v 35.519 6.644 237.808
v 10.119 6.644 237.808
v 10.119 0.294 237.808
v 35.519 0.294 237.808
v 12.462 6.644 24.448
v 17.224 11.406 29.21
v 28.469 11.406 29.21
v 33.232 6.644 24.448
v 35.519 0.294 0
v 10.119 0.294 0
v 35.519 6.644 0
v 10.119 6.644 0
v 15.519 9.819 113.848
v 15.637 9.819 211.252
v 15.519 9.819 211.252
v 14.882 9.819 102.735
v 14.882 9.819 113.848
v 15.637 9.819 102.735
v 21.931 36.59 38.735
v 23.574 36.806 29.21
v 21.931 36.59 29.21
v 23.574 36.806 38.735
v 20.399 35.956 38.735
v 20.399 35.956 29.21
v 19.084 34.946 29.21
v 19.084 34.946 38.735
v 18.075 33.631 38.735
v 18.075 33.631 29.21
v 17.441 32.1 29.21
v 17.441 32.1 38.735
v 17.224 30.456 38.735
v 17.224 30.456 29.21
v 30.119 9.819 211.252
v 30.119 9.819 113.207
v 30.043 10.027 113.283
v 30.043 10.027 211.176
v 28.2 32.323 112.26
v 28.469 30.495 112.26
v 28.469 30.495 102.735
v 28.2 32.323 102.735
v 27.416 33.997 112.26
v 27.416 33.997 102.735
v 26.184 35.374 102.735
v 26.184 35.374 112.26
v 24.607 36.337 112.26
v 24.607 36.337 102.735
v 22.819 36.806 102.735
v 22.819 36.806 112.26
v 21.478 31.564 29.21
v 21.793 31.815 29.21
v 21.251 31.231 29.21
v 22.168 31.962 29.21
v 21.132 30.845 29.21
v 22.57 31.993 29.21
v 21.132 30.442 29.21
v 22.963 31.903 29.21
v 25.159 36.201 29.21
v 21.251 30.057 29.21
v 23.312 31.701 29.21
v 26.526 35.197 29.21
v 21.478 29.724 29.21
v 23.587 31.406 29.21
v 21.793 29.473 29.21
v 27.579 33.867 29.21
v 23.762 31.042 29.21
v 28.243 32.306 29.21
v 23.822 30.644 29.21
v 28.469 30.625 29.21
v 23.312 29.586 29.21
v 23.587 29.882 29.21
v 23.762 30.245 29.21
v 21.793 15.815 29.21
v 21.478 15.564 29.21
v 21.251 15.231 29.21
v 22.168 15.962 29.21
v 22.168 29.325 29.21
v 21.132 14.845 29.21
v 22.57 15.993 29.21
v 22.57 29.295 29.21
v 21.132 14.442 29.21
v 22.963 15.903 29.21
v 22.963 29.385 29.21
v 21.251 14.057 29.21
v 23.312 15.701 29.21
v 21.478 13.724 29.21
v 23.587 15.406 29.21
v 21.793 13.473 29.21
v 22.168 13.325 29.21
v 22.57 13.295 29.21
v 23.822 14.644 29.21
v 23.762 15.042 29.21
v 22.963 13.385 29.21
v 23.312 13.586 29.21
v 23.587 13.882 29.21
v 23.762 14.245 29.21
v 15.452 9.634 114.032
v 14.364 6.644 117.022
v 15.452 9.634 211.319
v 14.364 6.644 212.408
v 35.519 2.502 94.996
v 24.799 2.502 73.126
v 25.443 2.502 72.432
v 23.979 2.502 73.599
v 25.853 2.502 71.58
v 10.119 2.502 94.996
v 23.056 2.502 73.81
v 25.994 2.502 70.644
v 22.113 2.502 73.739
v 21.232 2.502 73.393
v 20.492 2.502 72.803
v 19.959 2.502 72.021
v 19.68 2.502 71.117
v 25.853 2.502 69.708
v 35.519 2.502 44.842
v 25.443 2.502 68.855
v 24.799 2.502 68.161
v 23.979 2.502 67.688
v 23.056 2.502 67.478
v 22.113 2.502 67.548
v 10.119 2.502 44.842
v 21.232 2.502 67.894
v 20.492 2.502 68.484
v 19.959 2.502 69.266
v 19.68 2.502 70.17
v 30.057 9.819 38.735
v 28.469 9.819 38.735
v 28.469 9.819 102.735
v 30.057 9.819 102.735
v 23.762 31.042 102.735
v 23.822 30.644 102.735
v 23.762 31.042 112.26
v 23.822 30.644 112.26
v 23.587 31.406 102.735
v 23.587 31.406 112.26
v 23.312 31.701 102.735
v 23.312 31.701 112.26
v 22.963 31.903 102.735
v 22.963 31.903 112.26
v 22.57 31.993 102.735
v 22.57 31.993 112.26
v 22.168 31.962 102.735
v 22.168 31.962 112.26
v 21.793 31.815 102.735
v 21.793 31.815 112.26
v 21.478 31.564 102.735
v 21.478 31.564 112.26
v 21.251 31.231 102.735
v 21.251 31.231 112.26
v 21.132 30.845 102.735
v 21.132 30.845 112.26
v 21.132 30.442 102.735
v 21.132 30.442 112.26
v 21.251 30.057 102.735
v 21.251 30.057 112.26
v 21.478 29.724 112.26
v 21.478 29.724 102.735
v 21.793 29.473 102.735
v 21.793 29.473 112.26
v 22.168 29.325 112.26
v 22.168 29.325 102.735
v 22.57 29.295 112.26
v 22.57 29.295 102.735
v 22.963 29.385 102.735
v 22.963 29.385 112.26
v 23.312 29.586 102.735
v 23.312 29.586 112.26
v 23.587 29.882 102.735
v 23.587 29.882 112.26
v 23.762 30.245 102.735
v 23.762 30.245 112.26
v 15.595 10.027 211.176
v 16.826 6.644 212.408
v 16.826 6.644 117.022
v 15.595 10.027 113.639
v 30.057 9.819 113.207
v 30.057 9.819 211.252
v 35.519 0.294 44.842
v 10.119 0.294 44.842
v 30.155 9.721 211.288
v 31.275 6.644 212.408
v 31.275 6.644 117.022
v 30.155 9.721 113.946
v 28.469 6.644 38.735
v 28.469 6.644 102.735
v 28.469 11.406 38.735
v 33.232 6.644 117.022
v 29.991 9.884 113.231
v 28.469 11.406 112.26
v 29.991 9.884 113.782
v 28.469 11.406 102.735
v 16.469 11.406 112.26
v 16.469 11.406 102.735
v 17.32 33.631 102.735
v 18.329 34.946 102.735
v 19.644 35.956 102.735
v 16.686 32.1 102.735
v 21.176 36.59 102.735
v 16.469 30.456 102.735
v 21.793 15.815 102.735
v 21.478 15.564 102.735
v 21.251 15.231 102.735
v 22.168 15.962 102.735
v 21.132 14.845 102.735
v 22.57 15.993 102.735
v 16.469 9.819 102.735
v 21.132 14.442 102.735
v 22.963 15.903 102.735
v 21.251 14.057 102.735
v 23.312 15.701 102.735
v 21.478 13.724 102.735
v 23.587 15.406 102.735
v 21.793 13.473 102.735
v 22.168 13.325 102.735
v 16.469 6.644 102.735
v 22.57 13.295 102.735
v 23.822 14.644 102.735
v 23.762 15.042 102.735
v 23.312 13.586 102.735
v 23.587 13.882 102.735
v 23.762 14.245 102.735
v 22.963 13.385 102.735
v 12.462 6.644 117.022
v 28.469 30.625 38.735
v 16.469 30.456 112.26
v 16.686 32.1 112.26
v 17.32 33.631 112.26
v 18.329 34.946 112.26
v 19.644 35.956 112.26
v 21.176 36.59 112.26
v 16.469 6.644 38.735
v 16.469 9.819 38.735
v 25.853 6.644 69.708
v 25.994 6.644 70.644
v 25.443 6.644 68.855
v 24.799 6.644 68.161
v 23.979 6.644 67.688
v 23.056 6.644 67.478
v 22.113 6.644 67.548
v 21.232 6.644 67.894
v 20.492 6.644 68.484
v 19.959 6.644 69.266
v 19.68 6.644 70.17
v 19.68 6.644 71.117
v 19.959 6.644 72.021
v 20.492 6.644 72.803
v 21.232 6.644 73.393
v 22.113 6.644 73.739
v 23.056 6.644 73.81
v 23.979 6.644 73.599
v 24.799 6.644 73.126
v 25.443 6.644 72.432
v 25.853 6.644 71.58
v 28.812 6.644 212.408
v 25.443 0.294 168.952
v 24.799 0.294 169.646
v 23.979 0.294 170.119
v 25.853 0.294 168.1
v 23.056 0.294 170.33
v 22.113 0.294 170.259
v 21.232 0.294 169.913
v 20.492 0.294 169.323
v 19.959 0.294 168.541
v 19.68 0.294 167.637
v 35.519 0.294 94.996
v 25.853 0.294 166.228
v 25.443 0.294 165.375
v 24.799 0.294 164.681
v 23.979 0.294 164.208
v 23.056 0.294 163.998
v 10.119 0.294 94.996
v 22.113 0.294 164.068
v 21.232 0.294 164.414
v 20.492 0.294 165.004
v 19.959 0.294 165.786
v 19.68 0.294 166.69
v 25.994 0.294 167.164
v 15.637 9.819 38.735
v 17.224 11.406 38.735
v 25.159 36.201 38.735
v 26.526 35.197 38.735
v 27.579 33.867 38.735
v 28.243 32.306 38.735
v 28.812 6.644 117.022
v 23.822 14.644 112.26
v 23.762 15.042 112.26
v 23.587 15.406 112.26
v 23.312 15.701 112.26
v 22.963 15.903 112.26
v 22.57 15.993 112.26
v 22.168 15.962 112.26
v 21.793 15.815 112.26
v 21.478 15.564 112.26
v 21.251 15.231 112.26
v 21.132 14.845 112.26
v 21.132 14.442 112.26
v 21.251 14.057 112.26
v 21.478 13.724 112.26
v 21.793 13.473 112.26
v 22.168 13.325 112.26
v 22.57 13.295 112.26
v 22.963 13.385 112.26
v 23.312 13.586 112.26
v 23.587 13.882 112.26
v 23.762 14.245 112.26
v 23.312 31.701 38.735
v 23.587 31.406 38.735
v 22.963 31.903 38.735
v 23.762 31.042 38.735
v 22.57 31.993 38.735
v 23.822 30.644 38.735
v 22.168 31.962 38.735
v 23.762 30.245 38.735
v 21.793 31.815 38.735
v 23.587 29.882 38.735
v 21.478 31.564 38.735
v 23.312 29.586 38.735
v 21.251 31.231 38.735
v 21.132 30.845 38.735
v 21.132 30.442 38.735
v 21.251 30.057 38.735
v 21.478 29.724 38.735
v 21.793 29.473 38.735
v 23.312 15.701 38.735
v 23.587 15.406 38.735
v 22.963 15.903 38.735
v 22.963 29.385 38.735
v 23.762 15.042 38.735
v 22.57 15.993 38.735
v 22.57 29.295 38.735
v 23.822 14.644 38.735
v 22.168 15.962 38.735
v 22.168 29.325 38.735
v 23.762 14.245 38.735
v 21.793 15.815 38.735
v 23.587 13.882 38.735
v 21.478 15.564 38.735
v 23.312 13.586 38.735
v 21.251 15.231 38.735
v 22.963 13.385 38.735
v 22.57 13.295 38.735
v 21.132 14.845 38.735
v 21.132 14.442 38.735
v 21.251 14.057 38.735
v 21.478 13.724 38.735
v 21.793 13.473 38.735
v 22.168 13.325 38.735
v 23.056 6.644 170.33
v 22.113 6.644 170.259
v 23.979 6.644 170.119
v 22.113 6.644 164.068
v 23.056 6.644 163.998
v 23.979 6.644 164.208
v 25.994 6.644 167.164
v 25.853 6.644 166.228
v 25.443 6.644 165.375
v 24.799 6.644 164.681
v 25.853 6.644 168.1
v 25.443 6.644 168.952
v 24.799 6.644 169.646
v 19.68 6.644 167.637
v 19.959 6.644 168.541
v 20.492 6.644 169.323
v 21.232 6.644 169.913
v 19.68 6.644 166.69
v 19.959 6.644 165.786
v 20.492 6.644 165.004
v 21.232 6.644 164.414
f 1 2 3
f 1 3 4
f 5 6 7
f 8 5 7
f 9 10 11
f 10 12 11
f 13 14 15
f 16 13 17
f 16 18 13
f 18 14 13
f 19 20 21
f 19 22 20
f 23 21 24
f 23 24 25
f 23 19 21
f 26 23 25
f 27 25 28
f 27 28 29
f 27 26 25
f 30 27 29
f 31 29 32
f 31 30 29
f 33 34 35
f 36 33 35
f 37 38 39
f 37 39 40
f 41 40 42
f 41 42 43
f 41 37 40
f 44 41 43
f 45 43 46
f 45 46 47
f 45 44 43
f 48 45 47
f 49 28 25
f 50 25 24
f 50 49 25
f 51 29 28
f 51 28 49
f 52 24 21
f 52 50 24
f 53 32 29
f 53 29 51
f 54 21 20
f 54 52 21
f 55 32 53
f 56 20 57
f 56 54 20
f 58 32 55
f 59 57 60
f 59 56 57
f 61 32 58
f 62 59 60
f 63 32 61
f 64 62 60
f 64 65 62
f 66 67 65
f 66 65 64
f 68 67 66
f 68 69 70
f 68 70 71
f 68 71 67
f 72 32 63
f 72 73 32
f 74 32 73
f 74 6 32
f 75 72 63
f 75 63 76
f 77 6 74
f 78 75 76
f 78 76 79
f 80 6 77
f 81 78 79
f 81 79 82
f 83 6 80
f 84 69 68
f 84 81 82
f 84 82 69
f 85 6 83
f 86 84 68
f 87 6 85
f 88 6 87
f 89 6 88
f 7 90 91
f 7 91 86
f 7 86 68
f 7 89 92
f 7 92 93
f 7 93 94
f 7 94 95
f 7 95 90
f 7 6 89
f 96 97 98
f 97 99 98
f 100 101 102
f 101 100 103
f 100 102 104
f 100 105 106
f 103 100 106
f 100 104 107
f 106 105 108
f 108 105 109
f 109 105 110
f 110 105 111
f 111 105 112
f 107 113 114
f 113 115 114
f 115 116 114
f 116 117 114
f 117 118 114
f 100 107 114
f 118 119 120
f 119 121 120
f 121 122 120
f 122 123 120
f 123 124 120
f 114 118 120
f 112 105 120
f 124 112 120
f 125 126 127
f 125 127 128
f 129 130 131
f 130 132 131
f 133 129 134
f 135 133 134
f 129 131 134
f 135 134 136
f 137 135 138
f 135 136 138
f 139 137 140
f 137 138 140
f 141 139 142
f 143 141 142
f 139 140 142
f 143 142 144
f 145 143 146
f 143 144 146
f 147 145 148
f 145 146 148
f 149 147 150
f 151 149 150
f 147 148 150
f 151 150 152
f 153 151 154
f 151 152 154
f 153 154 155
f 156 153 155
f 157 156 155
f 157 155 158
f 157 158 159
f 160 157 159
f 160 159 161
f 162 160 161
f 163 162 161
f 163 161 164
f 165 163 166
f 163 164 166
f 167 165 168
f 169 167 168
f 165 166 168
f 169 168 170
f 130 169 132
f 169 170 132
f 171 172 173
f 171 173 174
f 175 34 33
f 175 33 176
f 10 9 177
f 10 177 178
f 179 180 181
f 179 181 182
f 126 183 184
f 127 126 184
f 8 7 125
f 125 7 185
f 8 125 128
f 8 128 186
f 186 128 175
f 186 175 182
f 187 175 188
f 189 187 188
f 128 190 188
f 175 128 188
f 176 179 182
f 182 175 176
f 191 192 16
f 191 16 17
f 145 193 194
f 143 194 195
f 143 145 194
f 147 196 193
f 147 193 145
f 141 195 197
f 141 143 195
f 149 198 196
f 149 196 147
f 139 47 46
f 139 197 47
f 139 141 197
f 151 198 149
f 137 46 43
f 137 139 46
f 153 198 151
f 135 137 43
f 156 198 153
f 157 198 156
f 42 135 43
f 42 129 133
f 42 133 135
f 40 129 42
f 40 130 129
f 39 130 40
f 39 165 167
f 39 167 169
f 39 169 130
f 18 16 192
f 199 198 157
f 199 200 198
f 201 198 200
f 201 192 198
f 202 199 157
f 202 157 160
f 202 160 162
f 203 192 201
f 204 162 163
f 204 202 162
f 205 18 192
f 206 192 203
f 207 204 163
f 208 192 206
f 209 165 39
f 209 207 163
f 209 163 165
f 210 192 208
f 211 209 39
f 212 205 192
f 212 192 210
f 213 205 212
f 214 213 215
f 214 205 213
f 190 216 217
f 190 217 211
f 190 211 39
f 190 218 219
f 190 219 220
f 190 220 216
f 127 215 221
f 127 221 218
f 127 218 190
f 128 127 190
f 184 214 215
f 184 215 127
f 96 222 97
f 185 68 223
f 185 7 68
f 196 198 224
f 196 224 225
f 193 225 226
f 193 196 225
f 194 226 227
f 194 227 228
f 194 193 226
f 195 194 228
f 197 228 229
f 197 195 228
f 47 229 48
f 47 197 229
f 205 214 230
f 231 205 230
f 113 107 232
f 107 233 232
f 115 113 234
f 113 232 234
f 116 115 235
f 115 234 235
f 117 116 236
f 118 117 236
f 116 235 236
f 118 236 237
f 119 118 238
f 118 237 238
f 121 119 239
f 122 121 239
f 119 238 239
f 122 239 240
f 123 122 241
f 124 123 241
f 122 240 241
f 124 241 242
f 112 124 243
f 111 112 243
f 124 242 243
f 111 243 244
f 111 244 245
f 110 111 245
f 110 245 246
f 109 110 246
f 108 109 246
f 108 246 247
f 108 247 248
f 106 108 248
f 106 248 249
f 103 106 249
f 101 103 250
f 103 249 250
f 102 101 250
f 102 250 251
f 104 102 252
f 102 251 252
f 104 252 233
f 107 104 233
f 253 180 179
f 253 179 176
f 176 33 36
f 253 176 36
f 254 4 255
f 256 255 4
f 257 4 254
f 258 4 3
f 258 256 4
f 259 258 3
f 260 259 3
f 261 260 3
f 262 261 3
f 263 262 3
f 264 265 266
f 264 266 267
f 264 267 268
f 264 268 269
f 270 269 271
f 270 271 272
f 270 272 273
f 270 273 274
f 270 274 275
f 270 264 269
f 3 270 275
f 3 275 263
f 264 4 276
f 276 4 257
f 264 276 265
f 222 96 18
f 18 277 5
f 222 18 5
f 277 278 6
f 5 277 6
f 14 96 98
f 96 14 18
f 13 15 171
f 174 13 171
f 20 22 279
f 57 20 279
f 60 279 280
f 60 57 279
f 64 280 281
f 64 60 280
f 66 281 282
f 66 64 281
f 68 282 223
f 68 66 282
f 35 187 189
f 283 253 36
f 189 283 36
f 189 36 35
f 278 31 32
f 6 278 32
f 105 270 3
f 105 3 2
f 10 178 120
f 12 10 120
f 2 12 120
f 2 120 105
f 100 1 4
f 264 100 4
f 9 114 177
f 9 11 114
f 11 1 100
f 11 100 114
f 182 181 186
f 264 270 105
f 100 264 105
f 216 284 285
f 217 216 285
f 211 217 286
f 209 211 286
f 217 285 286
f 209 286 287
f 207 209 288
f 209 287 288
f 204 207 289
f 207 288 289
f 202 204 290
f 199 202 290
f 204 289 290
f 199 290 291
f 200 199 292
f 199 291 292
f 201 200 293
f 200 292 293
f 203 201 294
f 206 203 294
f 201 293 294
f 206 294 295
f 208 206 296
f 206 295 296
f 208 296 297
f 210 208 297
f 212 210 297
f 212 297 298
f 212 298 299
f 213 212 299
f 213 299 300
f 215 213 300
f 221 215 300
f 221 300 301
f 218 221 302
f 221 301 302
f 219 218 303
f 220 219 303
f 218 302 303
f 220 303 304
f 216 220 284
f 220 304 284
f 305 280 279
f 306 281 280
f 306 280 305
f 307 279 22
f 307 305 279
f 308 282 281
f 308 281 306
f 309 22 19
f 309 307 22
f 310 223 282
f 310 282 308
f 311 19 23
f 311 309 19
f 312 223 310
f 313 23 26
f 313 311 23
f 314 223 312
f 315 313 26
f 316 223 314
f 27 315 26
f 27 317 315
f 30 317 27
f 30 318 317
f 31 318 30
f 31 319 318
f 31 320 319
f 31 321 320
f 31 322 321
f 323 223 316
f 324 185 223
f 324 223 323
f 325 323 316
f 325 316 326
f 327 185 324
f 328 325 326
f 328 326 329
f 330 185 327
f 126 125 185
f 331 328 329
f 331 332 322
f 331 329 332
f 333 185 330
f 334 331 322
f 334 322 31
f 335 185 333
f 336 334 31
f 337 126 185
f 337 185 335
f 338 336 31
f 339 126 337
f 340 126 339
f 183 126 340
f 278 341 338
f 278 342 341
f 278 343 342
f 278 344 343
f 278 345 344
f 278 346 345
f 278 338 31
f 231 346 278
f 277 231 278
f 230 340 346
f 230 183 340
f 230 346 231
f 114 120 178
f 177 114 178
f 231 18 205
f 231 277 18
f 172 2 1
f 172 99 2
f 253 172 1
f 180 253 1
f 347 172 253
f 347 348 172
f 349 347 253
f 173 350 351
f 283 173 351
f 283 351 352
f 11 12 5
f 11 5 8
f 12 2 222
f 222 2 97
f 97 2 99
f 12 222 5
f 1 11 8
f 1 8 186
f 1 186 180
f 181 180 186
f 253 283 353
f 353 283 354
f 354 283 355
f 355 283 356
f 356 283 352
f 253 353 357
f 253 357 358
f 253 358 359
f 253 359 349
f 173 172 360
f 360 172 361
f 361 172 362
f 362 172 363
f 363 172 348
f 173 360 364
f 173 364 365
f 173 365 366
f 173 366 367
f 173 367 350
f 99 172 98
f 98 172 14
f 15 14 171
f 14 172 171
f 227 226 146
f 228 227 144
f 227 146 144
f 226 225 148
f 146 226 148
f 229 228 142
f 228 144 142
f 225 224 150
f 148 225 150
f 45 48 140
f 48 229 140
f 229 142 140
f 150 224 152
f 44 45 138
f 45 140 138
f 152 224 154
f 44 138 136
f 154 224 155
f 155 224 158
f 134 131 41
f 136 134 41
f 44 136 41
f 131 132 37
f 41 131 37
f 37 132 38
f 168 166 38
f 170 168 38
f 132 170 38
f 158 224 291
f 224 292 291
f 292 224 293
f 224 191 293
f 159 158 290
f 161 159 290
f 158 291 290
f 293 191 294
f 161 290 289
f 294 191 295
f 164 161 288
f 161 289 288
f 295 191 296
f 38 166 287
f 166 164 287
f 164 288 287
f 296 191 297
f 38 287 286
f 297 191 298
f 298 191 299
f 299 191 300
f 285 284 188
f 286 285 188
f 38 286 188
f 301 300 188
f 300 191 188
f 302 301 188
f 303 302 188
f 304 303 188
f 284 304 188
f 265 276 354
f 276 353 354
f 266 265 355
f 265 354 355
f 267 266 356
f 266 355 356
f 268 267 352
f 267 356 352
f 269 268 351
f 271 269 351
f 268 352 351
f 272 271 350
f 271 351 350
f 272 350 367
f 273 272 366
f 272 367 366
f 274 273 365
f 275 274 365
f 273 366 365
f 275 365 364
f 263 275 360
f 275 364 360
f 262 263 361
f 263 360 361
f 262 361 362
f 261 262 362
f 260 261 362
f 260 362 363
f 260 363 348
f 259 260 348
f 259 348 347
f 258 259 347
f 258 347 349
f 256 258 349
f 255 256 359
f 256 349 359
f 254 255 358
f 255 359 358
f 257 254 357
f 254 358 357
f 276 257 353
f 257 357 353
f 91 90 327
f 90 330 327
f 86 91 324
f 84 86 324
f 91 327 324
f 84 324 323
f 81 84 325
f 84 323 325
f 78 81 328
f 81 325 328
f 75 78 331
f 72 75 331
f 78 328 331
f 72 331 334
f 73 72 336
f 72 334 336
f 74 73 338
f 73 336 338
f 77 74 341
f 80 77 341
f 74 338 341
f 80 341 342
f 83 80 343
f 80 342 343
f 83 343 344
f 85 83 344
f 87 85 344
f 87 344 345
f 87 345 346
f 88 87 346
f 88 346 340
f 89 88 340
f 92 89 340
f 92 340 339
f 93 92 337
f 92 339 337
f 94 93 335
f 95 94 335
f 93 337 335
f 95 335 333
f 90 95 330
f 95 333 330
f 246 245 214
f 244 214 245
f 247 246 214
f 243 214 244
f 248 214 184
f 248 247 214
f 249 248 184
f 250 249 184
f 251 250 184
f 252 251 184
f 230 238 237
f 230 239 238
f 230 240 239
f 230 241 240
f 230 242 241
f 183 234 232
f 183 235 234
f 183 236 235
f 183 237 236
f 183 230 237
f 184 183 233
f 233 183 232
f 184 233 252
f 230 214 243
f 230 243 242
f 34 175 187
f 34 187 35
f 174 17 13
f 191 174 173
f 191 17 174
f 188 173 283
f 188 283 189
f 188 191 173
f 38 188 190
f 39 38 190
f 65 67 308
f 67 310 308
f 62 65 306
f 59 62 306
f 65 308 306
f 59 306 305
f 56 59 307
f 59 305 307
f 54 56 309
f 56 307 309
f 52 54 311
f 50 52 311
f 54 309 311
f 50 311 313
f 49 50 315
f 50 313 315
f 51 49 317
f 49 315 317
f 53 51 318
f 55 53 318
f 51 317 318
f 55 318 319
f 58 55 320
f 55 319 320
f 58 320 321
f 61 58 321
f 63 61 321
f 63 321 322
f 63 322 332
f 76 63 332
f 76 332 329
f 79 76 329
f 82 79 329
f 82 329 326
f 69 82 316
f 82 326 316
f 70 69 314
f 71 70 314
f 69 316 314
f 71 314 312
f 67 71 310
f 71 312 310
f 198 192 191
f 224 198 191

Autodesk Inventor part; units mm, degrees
ref_plane "YZ Plane" through (0, 0, 0) normal (1, 0, 0) x (0, 1, 0)
ref_plane "XZ Plane" through (0, 0, 0) normal (0, 1, 0) x (-1, 0, 0)
ref_plane "XY Plane" through (0, 0, 0) normal (0, 0, 1) x (1, 0, 0)
sketch "Sketch1" plane through (0, 0, 0) normal (0, 0, 1) x (1, 0, 0)
  line L0 (10.1192, 6.6438) -> (35.5192, 6.6438)
  line L1 (35.5192, 6.6438) -> (35.5192, 0.2938)
  line L2 (35.5192, 0.2938) -> (10.1192, 0.2938)
  line L3 (10.1192, 0.2938) -> (10.1192, 6.6438)
  point P0 (0, 0)
  dimension "d0" = 25.4
  dimension "d1" = 6.35
extrude "Extrusion1" add sketch "Sketch1" along normal blind 237.8075
sketch "Sketch2" plane through (10.1192, 6.6438, 0) normal (0, 1, 0) x (1, 0, 0)
  line L0 (0, 0) -> (25.4, 0) projected
  line L1 (0, 0) -> (0, -237.8075) projected
  line L2 (25.4, -237.8075) -> (0, -237.8075) projected
  line L3 (25.4, 0) -> (25.4, -237.8075) projected
  line L4 (12.7, 0) -> (12.7, -237.8075) construction
  line L5 (25.4, -237.8075) -> (0, -237.8075) construction
  line L6 (0, 0) -> (0, -237.8075) construction
  line L7 (0, -167.1637) -> (25.4, -167.1637) construction
  line L8 (0, -70.6437) -> (25.4, -70.6437) construction
  line L9 (25.4, 0) -> (25.4, -237.8075) construction
  circle A0 centre (12.7, -70.6437) radius 3.175
  circle A1 centre (12.7, -167.1637) radius 3.175
  line L10 (32.1721, -167.1637) -> (32.1721, -237.8075) construction
  line L11 (29.604, -70.6437) -> (29.604, 0) construction
  point P0 (-10.1192, 0)
  dimension "d6" = 6.35
  dimension "d7" = 6.35
  dimension "d10" = 96.52
extrude "Extrusion2" cut sketch "Sketch2" against normal through all contours A0 | A1
sketch "Sketch3" plane through (10.1192, 0.2938, 0) normal (-1, 0, 0) x (0, 0, 1)
  line L0 (44.8421, -2.7964) -> (94.9957, -2.7964)
  line L1 (94.9957, -2.7964) -> (94.9957, 2.2087)
  line L2 (94.9957, 2.2087) -> (44.8421, 2.2087)
  line L3 (44.8421, 2.2087) -> (44.8421, -2.7964)
  point P0 (0, -0.2938)
extrude "Extrusion3" cut sketch "Sketch3" against normal through all
sketch "Sketch4" plane through (10.1192, 6.6438, 0) normal (0, 1, 0) x (1, 0, 0)
  line L0 (18.35, -38.735) -> (6.35, -38.735) projected
  line L1 (6.35, -102.735) -> (18.35, -102.735) projected
  line L2 (18.35, -38.735) -> (7.105, -38.735)
  line L3 (7.105, -38.735) -> (7.105, -29.21)
  line L4 (7.105, -29.21) -> (18.35, -29.21)
  line L5 (18.35, -29.21) -> (18.35, -38.735)
  line L6 (18.35, -102.735) -> (6.35, -102.735)
  line L7 (6.35, -102.735) -> (6.35, -112.26)
  line L8 (6.35, -112.26) -> (18.35, -112.26)
  line L9 (18.35, -112.26) -> (18.35, -102.735)
  point P0 (-10.1192, 0)
  dimension "d13" = 9.525
  dimension "d14" = 9.525
extrude "Extrusion4" add sketch "Sketch4" along normal blind 30.1625
chamfer "Chamfer1" distance 4.7625 angle 45 2 edges at (22.8467, 6.6438, 29.21) (22.4692, 6.6438, 112.26)
sketch "Sketch5" plane through (16.4692, 36.8063, 112.26) normal (0, 0, 1) x (1, 0, 0)
  circle A0 centre (6, -22.1625) radius 1.3525 projected
  circle A1 centre (6, -6.1625) radius 1.3525 projected
  point P0 (-16.4692, -36.8063)
extrude "Extrusion5" cut sketch "Sketch5" against normal through all
fillet "Fillet1" radius 6.35 4 edges at (16.4692, 36.8063, 107.4975) (28.4692, 36.8063, 107.4975) (17.2242, 36.8063, 33.9725) (28.4692, 36.8063, 33.9725)
chamfer "Chamfer2" distance 4.7625 angle 45 4 edges at (16.4692, 6.6438, 109.8788) (28.4692, 6.6438, 109.8788) (28.4692, 6.6438, 31.5913) (17.2242, 6.6438, 31.5913)
sketch "Sketch6" plane through (10.1192, 6.6438, 0) normal (0, 1, 0) x (1, 0, 0)
  line L0 (25.4, -237.8075) -> (0, -237.8075) projected
  line L1 (18.6927, -237.8075) -> (21.1555, -237.8075)
  line L2 (21.1555, -212.4075) -> (21.1555, -112.0518)
  line L3 (21.1555, -112.0518) -> (18.6927, -112.0518)
  line L4 (18.6927, -112.0518) -> (18.6927, -212.4075)
  line L5 (6.7073, -237.8075) -> (4.2445, -237.8075)
  line L6 (4.2445, -212.4075) -> (4.2445, -112.0518)
  line L7 (4.2445, -112.0518) -> (6.7073, -112.0518)
  line L8 (6.7073, -112.0518) -> (6.7073, -212.4075)
  line L9 (25.4, 0) -> (25.4, -237.8075) projected
  line L10 (0, 0) -> (0, -237.8075) projected
  line L11 (21.1555, -171.8415) -> (25.4, -171.8415)
  line L12 (4.2445, -171.8415) -> (0, -171.8415)
  line L13 (20.8665, -0.289) -> (18.4037, -0.289)
  line L14 (18.4037, -34.2615) -> (20.8665, -34.2615)
  line L15 (7.105, -29.21) -> (2.3425, -24.4475) projected
  line L16 (3.9555, -0.289) -> (6.4182, -0.289)
  line L17 (6.4182, -28.5232) -> (3.9555, -28.5232)
  line L18 (31.115, -212.4075) -> (-5.715, -212.4075) projected
  point P0 (-10.1192, 0)
  point P1 (21.1555, -225.1075)
  point P2 (18.6927, -225.1075)
  point P3 (6.7073, -225.1075)
  point P4 (4.2445, -225.1075)
extrude "Extrusion6" add sketch "Sketch6" along normal blind 4.7625 draft -20 contours L18 L4 L3 L2 | L18 L6 L7 L8
sketch "Sketch7" plane through (10.1192, 6.6438, 0) normal (0, 1, 0) x (1, 0, 0)
  line L0 (18.35, -90.5879) -> (18.35, -50.8821) construction
  line L1 (6.35, -50.8821) -> (6.35, -90.5879) construction
  line L2 (18.35, -99.735) -> (18.35, -41.735) construction
  line L3 (6.35, -99.735) -> (18.35, -99.735) construction
  line L4 (6.35, -41.735) -> (6.35, -99.735) construction
  line L5 (18.35, -41.735) -> (6.35, -41.735) construction
  circle A0 centre (12.35, -54.735) radius 1.3525 construction
  circle A1 centre (12.35, -62.735) radius 1.3525 construction
  circle A2 centre (12.35, -78.735) radius 1.3525 construction
  circle A3 centre (12.35, -86.735) radius 1.3525 construction
  line L6 (1.5875, -102.735) -> (23.1125, -102.735) projected
  line L7 (23.1125, -38.735) -> (2.3425, -38.735) projected
  line L8 (25.4, 0) -> (25.4, -44.8421) projected
  line L9 (18.35, -102.735) -> (25.4, -102.735)
  line L10 (25.4, -102.735) -> (25.4, -38.735)
  line L11 (25.4, -38.735) -> (18.35, -38.735)
  line L12 (18.35, -38.735) -> (18.35, -102.735)
  line L13 (0, 0) -> (0, -237.8075) projected
  line L14 (0, -102.735) -> (6.35, -102.735)
  line L15 (6.35, -102.735) -> (6.35, -38.735)
  line L16 (6.35, -38.735) -> (0, -38.735)
  line L17 (0, -38.735) -> (0, -102.735)
  point P0 (-10.1192, 0)
extrude "Extrusion7" add sketch "Sketch7" along normal blind 3.175 contours L14 L13 L16 L7 L15 L6 | L12 L7 L11 L8 L10 L9 L6
sketch "Sketch8" plane through (35.5192, 6.6438, 38.735) normal (0, 0, -1) x (-1, 0, 0)
  line L0 (5.4625, 3.175) -> (2.2875, 0) projected
  line L1 (0, 3.175) -> (5.4625, 3.175) projected
  line L2 (0, 0) -> (0, 3.175) projected
  line L3 (2.2875, 0) -> (0, 0) projected
  line L4 (23.0575, 0) -> (19.8825, 3.175) projected
  line L5 (25.4, 0) -> (23.0575, 0) projected
  line L6 (25.4, 0) -> (25.4, 3.175) projected
  line L7 (19.8825, 3.175) -> (25.4, 3.175) projected
  point P0 (35.5192, -6.6438)
extrude "Extrusion8" cut sketch "Sketch8" against normal through all
properties part number "Top piece"
